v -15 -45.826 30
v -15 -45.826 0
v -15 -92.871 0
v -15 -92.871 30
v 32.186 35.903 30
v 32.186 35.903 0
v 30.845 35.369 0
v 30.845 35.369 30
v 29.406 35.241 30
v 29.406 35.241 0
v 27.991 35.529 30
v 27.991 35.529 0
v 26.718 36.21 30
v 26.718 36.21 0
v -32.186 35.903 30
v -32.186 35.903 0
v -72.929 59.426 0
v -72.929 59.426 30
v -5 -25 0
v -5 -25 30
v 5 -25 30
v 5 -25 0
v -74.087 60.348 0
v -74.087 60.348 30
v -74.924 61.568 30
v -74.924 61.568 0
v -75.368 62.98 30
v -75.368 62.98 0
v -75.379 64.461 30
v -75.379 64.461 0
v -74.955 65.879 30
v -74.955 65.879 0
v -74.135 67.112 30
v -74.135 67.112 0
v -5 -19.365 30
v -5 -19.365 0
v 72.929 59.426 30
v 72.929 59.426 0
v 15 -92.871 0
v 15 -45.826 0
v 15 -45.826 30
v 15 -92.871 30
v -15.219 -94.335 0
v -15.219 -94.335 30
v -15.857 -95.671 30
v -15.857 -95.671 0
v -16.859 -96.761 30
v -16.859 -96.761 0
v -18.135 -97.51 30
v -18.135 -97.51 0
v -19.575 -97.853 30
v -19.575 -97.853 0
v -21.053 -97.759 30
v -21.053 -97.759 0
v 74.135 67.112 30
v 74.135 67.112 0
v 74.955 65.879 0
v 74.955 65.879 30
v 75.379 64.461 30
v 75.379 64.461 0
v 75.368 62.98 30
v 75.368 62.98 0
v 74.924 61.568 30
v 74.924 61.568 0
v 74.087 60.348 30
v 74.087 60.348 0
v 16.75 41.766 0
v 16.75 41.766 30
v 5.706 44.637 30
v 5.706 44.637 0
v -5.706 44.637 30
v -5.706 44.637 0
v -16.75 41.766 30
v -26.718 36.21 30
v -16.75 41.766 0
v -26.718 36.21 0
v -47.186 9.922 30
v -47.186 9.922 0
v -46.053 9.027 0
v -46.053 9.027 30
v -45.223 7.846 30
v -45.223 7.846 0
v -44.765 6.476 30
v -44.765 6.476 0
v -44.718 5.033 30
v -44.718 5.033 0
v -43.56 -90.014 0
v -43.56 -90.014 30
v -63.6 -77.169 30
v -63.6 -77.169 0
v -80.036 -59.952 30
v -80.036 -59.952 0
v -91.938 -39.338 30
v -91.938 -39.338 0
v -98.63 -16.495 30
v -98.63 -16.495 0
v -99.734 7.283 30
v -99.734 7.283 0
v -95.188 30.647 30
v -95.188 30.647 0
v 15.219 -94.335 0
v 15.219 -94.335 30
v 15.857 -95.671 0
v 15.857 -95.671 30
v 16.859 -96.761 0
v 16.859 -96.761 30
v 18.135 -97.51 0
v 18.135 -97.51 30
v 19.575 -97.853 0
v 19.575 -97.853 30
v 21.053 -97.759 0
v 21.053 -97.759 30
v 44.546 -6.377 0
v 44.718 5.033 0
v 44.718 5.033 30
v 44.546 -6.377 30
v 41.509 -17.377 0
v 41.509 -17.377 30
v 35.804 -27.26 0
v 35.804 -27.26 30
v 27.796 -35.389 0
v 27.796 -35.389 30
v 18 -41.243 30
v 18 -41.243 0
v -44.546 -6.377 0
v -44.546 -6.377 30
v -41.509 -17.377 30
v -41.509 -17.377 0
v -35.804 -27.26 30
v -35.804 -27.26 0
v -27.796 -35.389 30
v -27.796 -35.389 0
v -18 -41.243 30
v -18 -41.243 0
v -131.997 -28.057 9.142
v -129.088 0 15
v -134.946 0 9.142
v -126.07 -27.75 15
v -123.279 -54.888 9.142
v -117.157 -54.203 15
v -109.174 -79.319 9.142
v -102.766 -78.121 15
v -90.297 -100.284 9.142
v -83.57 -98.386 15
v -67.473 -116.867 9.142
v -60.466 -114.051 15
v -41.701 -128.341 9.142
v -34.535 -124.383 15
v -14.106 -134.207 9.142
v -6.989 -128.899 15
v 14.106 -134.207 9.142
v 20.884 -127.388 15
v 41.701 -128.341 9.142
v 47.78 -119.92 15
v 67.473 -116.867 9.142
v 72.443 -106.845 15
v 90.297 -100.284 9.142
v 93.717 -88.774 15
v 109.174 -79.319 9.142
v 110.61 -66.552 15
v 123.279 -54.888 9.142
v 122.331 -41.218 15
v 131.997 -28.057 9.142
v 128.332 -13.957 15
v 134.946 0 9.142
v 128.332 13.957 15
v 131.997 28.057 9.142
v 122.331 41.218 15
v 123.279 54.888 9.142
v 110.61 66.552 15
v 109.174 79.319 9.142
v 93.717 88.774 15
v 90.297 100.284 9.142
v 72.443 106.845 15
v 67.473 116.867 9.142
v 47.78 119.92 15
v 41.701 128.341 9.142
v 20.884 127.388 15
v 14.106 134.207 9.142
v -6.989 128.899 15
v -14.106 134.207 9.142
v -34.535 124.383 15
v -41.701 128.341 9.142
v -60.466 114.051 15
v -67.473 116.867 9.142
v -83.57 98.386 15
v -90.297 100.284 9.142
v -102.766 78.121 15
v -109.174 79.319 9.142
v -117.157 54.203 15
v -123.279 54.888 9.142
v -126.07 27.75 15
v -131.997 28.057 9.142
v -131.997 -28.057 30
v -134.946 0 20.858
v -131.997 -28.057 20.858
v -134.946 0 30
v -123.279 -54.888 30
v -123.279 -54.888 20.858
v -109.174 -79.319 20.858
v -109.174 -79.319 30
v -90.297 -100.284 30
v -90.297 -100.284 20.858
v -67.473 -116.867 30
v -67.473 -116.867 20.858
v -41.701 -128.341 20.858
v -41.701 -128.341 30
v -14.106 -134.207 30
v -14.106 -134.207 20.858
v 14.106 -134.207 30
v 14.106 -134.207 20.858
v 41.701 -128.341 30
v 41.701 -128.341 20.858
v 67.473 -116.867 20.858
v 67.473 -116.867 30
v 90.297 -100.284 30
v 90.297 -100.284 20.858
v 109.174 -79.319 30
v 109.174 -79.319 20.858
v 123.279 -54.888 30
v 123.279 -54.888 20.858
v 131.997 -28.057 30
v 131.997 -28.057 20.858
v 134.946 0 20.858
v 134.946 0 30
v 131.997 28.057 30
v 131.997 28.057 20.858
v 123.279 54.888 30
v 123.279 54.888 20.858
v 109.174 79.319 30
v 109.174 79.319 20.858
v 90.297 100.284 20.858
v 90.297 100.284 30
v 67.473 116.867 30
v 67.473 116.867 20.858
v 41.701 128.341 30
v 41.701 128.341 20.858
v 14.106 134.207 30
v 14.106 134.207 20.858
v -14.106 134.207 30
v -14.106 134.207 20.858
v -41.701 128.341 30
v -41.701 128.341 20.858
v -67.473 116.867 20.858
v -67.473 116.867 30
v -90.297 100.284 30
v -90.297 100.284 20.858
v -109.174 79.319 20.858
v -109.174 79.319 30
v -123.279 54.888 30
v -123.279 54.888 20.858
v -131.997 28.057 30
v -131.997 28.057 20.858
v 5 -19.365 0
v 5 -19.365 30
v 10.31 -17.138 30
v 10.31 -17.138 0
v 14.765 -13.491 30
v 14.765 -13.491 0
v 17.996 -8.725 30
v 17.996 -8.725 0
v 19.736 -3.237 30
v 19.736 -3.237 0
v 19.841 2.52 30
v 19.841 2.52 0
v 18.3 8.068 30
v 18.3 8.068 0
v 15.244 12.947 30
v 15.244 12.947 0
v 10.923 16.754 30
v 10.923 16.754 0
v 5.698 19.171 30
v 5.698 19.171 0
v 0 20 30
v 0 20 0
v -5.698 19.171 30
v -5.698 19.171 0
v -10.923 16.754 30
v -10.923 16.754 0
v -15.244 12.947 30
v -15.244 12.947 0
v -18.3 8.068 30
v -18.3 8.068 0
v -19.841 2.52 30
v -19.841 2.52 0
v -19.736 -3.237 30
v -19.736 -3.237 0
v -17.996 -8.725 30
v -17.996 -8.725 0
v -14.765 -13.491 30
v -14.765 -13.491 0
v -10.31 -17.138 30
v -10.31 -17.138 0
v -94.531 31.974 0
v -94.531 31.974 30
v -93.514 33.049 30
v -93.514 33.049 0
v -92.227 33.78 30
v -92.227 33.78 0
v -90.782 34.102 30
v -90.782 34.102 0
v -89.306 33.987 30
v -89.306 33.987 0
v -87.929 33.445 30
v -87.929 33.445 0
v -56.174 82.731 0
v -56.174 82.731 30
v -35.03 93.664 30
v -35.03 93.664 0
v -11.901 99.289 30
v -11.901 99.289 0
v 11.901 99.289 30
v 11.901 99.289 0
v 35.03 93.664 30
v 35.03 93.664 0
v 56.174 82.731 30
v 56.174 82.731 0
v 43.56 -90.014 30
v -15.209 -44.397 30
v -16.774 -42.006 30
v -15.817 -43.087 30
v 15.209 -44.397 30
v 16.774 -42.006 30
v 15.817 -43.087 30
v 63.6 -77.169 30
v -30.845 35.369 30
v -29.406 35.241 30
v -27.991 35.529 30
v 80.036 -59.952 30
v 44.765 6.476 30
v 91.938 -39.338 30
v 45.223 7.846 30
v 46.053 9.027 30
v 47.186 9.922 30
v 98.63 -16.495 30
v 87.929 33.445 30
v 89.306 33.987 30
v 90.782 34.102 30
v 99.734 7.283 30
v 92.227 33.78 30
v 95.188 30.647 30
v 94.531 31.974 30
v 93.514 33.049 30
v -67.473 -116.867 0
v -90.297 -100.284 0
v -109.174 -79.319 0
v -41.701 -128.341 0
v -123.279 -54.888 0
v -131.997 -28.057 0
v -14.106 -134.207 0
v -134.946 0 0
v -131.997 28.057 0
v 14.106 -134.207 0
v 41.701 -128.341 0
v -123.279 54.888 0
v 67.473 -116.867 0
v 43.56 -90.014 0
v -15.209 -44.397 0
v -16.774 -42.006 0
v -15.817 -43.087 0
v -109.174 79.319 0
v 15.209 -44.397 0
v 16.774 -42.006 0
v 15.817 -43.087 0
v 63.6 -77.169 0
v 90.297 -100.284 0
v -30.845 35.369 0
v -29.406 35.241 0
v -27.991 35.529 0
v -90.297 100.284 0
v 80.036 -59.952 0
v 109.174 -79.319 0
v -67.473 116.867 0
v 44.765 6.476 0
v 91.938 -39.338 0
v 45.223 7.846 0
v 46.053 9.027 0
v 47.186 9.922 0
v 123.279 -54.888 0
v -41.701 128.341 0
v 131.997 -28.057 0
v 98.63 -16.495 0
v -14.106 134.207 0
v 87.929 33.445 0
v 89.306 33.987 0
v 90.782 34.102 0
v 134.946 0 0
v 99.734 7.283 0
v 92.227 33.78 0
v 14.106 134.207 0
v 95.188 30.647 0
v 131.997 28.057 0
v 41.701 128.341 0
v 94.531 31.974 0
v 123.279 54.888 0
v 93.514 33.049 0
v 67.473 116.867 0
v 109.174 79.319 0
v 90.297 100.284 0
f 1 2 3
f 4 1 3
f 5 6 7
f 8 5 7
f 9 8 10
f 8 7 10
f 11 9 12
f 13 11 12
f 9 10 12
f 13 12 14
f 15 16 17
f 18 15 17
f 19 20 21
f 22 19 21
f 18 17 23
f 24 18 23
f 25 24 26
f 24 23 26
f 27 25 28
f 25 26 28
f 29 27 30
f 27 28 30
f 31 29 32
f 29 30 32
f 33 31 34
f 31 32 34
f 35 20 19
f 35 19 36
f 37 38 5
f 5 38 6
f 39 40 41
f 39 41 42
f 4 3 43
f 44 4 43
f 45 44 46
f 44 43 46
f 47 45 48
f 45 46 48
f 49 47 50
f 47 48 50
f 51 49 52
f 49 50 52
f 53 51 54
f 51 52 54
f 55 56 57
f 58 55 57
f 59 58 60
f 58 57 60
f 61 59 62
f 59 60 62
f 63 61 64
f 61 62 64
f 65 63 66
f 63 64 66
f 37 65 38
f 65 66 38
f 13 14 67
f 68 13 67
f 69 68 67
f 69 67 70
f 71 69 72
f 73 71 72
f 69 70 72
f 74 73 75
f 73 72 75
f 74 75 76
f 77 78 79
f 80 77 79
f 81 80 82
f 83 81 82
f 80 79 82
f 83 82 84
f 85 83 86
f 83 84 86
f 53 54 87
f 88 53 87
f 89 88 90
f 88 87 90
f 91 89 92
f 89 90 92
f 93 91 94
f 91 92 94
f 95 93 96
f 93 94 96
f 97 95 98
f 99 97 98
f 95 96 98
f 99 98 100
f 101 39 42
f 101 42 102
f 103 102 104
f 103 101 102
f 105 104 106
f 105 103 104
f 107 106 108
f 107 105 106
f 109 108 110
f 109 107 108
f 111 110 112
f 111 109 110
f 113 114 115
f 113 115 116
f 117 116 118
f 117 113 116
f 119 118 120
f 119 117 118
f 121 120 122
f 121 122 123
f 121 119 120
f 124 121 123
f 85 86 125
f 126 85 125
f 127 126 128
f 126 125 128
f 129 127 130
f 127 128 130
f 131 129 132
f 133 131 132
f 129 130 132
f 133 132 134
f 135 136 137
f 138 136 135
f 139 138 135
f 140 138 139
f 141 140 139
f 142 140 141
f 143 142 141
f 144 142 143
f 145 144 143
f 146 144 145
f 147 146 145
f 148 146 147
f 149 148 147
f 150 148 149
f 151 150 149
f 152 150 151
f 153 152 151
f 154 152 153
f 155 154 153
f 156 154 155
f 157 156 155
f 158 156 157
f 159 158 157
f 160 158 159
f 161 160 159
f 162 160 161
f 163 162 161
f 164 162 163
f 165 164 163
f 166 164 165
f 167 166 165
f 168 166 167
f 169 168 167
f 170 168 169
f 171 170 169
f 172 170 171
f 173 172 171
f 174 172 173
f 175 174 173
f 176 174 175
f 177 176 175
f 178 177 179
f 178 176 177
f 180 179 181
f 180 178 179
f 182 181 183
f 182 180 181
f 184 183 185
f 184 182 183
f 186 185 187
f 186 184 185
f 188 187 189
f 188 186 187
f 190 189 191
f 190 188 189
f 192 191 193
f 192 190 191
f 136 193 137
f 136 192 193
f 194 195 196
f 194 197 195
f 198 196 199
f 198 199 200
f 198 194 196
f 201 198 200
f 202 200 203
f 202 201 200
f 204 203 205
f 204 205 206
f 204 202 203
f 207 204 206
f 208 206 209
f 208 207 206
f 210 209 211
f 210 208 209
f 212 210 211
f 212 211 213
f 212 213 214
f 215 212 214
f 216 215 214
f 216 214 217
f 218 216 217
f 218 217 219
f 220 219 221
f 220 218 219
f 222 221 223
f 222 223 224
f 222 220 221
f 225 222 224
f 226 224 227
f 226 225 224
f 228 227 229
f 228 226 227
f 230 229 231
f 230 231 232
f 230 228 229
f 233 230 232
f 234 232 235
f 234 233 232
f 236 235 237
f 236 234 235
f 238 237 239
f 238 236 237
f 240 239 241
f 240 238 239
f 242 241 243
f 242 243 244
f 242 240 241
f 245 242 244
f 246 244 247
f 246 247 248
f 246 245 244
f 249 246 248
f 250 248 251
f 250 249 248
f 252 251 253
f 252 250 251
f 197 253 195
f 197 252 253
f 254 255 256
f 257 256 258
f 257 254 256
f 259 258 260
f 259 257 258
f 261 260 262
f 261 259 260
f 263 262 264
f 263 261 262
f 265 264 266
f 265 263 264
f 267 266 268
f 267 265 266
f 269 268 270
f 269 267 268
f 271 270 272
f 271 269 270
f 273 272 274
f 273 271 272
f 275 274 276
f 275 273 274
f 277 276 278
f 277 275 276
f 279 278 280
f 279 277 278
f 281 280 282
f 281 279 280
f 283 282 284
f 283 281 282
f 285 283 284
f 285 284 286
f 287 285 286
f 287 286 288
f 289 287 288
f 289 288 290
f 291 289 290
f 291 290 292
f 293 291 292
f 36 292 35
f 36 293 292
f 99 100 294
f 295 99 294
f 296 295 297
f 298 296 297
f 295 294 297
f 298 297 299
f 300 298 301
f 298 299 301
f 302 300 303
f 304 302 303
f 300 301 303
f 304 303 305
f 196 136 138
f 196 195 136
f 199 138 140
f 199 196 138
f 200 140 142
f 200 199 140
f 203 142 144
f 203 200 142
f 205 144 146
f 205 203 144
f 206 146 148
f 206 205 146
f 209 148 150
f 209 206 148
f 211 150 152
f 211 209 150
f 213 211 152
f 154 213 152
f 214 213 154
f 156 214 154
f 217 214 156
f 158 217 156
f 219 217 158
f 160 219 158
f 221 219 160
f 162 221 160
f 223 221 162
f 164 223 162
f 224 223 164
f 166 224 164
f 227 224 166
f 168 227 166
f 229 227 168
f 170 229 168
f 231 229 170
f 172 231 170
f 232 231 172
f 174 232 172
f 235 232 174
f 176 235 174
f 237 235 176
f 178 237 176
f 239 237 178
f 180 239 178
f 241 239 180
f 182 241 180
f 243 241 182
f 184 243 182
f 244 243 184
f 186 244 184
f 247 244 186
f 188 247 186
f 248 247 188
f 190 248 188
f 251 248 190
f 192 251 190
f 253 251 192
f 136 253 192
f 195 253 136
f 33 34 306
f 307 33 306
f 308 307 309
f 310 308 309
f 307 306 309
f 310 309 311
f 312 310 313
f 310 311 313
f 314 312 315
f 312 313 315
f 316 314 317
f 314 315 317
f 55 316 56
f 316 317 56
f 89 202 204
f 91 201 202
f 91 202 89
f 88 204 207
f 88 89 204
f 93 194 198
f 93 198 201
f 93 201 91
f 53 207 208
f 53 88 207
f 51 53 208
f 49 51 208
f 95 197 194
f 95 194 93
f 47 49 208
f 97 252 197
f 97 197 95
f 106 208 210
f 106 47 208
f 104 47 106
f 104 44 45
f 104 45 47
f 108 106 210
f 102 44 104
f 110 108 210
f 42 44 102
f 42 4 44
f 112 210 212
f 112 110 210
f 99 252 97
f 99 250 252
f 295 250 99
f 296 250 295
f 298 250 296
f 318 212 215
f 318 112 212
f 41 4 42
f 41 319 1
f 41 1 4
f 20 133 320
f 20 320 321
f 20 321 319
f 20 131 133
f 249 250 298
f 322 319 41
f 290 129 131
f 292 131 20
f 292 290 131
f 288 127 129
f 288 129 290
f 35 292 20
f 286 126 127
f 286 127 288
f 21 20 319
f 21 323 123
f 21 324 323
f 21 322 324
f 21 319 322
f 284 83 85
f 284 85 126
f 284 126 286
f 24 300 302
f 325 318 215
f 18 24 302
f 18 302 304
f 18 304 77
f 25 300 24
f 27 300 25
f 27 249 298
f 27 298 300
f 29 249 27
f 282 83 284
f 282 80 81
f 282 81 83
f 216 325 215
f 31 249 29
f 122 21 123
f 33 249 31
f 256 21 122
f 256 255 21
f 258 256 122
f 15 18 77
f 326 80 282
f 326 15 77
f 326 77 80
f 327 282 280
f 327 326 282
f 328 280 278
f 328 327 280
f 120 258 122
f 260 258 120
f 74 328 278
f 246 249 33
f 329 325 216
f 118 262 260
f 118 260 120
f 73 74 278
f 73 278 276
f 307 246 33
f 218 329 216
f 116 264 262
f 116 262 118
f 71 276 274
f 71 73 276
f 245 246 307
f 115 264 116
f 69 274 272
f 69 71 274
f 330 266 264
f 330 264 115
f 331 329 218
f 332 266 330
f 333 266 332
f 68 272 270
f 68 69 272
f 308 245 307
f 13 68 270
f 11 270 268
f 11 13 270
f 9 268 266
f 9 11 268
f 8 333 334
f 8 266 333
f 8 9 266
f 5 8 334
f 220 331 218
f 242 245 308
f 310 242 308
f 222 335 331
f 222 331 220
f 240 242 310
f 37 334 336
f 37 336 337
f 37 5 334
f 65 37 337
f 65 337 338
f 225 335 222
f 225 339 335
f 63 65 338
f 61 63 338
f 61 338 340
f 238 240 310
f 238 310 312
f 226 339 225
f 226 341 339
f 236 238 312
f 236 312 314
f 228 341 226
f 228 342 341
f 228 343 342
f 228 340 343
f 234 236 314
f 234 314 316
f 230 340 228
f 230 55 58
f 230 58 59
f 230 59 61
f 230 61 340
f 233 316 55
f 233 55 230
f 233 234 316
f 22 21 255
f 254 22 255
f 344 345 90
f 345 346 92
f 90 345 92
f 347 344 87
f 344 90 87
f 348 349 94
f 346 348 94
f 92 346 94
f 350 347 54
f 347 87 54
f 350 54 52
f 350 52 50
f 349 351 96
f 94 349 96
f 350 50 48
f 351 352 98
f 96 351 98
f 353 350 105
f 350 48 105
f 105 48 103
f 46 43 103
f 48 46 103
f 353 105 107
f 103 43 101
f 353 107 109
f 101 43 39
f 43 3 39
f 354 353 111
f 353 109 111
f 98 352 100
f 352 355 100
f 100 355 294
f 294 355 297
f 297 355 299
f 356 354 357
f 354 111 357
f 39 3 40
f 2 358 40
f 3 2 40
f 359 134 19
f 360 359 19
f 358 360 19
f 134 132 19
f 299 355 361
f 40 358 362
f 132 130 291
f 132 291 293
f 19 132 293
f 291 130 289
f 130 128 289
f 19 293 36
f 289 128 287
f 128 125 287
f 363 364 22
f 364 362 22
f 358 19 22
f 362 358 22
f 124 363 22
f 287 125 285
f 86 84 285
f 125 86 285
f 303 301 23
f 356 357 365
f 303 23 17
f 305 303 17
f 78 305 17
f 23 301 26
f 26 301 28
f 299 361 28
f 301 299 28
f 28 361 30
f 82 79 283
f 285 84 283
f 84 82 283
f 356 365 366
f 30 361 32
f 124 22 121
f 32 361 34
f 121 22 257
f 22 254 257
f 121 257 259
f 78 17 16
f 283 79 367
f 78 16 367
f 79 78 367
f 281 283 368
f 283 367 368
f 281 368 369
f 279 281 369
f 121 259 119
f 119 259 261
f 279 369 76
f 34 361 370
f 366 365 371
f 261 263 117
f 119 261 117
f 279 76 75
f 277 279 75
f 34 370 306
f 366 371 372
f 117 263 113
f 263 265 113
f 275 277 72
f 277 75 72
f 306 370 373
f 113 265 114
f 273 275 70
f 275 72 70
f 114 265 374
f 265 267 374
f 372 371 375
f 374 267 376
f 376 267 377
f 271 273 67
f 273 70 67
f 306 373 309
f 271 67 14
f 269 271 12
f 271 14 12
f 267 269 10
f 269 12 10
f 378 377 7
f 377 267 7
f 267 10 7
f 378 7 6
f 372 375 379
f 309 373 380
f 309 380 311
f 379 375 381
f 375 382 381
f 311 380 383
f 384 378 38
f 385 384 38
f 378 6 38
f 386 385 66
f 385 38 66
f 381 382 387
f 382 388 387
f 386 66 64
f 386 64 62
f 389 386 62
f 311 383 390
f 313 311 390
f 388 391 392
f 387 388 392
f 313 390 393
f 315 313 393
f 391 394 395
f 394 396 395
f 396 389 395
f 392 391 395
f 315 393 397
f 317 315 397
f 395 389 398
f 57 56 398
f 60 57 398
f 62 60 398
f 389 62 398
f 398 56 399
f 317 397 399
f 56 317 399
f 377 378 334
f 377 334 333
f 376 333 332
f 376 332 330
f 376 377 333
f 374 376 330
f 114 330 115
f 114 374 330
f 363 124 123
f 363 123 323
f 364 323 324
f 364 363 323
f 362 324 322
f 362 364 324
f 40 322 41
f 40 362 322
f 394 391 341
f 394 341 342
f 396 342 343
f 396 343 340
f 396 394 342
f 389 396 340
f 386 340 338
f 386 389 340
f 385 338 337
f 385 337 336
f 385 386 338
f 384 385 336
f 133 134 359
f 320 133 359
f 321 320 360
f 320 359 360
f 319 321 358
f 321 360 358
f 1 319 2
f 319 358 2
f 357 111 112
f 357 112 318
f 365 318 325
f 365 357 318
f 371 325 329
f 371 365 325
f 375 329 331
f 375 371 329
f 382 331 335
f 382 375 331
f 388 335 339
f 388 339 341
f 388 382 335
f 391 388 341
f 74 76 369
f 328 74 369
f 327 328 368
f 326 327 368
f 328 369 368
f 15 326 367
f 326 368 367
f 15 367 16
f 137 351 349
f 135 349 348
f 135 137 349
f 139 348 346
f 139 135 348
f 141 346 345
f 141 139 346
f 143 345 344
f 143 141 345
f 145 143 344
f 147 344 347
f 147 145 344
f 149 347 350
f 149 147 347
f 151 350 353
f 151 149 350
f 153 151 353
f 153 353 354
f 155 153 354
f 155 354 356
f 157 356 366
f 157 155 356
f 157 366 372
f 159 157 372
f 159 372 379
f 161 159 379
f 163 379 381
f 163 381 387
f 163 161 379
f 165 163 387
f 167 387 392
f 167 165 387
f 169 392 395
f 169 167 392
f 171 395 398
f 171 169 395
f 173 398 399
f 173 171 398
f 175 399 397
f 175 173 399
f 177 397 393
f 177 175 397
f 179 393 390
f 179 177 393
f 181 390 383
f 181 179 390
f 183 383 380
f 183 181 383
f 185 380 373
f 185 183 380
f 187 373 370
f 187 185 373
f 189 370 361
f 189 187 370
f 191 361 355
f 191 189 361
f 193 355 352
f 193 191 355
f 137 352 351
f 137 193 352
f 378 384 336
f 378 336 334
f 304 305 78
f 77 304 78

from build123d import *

# Parameters (mm, degrees)
SKETCH1_R           = 125
SKETCH1_R_2         = 20
BOSS_EXTRUDE1_DEPTH = 30
CUT_EXTRUDE1_REACH  = 181.304
SKETCH2_W           = 10
SKETCH2_H           = 10


with BuildPart() as part:
    # Sketch1 → Boss-Extrude1 (new body)
    with BuildSketch(Plane.XY):
        Circle(SKETCH1_R)
        Circle(SKETCH1_R_2, mode=Mode.SUBTRACT)
        with BuildLine():
            Line((-15, -45.82575695), (-15, -92.870878105))
            ThreePointArc((-15, -92.870878105), (-16.858595688, -96.760811131), (-21.052631579, -97.758819058))
            ThreePointArc((-21.052631579, -97.758819058), (-86.602540378, -50), (-95.187936538, 30.647295765))
            ThreePointArc((-95.187936538, 30.647295765), (-92.226618374, 33.780433428), (-87.928539711, 33.445057996))
            Line((-87.928539711, 33.445057996), (-47.186269666, 9.922497418))
            ThreePointArc((-47.186269666, 9.922497418), (-45.222911355, 7.845908192), (-44.717642699, 5.033133359))
            ThreePointArc((-44.717642699, 5.033133359), (-38.97114317, -22.5), (-18, -41.243181255))
            ThreePointArc((-18, -41.243181255), (-15.816699867, -43.087144162), (-15, -45.82575695))
        make_face(mode=Mode.SUBTRACT)
        with BuildLine():
            Line((15, -45.82575695), (15, -92.870878105))
            ThreePointArc((15, -92.870878105), (16.858595688, -96.760811131), (21.052631579, -97.758819058))
            ThreePointArc((21.052631579, -97.758819058), (86.602540378, -50), (95.187936538, 30.647295765))
            ThreePointArc((95.187936538, 30.647295765), (92.226618374, 33.780433428), (87.928539711, 33.445057996))
            Line((87.928539711, 33.445057996), (47.186269666, 9.922497418))
            ThreePointArc((47.186269666, 9.922497418), (45.222911355, 7.845908192), (44.717642699, 5.033133359))
            ThreePointArc((44.717642699, 5.033133359), (38.97114317, -22.5), (18, -41.243181255))
            ThreePointArc((18, -41.243181255), (15.816699867, -43.087144162), (15, -45.82575695))
        make_face(mode=Mode.SUBTRACT)
        with BuildLine():
            Line((-32.186269666, 35.903259532), (-72.928539711, 59.425820109))
            ThreePointArc((-72.928539711, 59.425820109), (-75.368022686, 62.980377703), (-74.135304959, 67.111523293))
            ThreePointArc((-74.135304959, 67.111523293), (0, 100), (74.135304959, 67.111523293))
            ThreePointArc((74.135304959, 67.111523293), (75.368022686, 62.980377703), (72.928539711, 59.425820109))
            Line((72.928539711, 59.425820109), (32.186269666, 35.903259532))
            ThreePointArc((32.186269666, 35.903259532), (29.406211487, 35.24123597), (26.717642699, 36.210047895))
            ThreePointArc((26.717642699, 36.210047895), (0, 45), (-26.717642699, 36.210047895))
            ThreePointArc((-26.717642699, 36.210047895), (-29.406211487, 35.24123597), (-32.186269666, 35.903259532))
        make_face(mode=Mode.SUBTRACT)
    extrude(amount=BOSS_EXTRUDE1_DEPTH)

    # Sketch2 → Cut-Extrude1 (cut, up to next)
    with BuildSketch(Plane.XY.offset(30), mode=Mode.PRIVATE) as cut_extrude1_sk1:
        with Locations((0, -20)):
            Rectangle(SKETCH2_W, SKETCH2_H)
    cut_extrude1_tool1 = extrude(cut_extrude1_sk1.sketch, amount=-CUT_EXTRUDE1_REACH, mode=Mode.PRIVATE) & part.part
    add(cut_extrude1_tool1.solids().sort_by_distance((0, -20, 30))[0], mode=Mode.SUBTRACT)

    # Sketch3 → Revolve-Thin1 (revolve)
    with BuildSketch(Plane(origin=(0, 0, 0), x_dir=(0, 0, -1), z_dir=(1, 0, 0)), mode=Mode.PRIVATE) as revolve_thin1_sk:
        Polygon((-30, 124.946096873), (-25, 124.946096873), (-15, 114.946096873), (-5, 124.946096873), (0, 124.946096873), (0, 134.946096873), (-9.142135624, 134.946096873), (-15, 129.088232497), (-20.857864376, 134.946096873), (-30, 134.946096873), align=None)
    revolve(revolve_thin1_sk.sketch.rotate(Axis((0, 0, -10.871805442), (0, 0, 1)), 90), axis=Axis((0, 0, -10.871805442), (0, 0, 1)))


solid = part.part
